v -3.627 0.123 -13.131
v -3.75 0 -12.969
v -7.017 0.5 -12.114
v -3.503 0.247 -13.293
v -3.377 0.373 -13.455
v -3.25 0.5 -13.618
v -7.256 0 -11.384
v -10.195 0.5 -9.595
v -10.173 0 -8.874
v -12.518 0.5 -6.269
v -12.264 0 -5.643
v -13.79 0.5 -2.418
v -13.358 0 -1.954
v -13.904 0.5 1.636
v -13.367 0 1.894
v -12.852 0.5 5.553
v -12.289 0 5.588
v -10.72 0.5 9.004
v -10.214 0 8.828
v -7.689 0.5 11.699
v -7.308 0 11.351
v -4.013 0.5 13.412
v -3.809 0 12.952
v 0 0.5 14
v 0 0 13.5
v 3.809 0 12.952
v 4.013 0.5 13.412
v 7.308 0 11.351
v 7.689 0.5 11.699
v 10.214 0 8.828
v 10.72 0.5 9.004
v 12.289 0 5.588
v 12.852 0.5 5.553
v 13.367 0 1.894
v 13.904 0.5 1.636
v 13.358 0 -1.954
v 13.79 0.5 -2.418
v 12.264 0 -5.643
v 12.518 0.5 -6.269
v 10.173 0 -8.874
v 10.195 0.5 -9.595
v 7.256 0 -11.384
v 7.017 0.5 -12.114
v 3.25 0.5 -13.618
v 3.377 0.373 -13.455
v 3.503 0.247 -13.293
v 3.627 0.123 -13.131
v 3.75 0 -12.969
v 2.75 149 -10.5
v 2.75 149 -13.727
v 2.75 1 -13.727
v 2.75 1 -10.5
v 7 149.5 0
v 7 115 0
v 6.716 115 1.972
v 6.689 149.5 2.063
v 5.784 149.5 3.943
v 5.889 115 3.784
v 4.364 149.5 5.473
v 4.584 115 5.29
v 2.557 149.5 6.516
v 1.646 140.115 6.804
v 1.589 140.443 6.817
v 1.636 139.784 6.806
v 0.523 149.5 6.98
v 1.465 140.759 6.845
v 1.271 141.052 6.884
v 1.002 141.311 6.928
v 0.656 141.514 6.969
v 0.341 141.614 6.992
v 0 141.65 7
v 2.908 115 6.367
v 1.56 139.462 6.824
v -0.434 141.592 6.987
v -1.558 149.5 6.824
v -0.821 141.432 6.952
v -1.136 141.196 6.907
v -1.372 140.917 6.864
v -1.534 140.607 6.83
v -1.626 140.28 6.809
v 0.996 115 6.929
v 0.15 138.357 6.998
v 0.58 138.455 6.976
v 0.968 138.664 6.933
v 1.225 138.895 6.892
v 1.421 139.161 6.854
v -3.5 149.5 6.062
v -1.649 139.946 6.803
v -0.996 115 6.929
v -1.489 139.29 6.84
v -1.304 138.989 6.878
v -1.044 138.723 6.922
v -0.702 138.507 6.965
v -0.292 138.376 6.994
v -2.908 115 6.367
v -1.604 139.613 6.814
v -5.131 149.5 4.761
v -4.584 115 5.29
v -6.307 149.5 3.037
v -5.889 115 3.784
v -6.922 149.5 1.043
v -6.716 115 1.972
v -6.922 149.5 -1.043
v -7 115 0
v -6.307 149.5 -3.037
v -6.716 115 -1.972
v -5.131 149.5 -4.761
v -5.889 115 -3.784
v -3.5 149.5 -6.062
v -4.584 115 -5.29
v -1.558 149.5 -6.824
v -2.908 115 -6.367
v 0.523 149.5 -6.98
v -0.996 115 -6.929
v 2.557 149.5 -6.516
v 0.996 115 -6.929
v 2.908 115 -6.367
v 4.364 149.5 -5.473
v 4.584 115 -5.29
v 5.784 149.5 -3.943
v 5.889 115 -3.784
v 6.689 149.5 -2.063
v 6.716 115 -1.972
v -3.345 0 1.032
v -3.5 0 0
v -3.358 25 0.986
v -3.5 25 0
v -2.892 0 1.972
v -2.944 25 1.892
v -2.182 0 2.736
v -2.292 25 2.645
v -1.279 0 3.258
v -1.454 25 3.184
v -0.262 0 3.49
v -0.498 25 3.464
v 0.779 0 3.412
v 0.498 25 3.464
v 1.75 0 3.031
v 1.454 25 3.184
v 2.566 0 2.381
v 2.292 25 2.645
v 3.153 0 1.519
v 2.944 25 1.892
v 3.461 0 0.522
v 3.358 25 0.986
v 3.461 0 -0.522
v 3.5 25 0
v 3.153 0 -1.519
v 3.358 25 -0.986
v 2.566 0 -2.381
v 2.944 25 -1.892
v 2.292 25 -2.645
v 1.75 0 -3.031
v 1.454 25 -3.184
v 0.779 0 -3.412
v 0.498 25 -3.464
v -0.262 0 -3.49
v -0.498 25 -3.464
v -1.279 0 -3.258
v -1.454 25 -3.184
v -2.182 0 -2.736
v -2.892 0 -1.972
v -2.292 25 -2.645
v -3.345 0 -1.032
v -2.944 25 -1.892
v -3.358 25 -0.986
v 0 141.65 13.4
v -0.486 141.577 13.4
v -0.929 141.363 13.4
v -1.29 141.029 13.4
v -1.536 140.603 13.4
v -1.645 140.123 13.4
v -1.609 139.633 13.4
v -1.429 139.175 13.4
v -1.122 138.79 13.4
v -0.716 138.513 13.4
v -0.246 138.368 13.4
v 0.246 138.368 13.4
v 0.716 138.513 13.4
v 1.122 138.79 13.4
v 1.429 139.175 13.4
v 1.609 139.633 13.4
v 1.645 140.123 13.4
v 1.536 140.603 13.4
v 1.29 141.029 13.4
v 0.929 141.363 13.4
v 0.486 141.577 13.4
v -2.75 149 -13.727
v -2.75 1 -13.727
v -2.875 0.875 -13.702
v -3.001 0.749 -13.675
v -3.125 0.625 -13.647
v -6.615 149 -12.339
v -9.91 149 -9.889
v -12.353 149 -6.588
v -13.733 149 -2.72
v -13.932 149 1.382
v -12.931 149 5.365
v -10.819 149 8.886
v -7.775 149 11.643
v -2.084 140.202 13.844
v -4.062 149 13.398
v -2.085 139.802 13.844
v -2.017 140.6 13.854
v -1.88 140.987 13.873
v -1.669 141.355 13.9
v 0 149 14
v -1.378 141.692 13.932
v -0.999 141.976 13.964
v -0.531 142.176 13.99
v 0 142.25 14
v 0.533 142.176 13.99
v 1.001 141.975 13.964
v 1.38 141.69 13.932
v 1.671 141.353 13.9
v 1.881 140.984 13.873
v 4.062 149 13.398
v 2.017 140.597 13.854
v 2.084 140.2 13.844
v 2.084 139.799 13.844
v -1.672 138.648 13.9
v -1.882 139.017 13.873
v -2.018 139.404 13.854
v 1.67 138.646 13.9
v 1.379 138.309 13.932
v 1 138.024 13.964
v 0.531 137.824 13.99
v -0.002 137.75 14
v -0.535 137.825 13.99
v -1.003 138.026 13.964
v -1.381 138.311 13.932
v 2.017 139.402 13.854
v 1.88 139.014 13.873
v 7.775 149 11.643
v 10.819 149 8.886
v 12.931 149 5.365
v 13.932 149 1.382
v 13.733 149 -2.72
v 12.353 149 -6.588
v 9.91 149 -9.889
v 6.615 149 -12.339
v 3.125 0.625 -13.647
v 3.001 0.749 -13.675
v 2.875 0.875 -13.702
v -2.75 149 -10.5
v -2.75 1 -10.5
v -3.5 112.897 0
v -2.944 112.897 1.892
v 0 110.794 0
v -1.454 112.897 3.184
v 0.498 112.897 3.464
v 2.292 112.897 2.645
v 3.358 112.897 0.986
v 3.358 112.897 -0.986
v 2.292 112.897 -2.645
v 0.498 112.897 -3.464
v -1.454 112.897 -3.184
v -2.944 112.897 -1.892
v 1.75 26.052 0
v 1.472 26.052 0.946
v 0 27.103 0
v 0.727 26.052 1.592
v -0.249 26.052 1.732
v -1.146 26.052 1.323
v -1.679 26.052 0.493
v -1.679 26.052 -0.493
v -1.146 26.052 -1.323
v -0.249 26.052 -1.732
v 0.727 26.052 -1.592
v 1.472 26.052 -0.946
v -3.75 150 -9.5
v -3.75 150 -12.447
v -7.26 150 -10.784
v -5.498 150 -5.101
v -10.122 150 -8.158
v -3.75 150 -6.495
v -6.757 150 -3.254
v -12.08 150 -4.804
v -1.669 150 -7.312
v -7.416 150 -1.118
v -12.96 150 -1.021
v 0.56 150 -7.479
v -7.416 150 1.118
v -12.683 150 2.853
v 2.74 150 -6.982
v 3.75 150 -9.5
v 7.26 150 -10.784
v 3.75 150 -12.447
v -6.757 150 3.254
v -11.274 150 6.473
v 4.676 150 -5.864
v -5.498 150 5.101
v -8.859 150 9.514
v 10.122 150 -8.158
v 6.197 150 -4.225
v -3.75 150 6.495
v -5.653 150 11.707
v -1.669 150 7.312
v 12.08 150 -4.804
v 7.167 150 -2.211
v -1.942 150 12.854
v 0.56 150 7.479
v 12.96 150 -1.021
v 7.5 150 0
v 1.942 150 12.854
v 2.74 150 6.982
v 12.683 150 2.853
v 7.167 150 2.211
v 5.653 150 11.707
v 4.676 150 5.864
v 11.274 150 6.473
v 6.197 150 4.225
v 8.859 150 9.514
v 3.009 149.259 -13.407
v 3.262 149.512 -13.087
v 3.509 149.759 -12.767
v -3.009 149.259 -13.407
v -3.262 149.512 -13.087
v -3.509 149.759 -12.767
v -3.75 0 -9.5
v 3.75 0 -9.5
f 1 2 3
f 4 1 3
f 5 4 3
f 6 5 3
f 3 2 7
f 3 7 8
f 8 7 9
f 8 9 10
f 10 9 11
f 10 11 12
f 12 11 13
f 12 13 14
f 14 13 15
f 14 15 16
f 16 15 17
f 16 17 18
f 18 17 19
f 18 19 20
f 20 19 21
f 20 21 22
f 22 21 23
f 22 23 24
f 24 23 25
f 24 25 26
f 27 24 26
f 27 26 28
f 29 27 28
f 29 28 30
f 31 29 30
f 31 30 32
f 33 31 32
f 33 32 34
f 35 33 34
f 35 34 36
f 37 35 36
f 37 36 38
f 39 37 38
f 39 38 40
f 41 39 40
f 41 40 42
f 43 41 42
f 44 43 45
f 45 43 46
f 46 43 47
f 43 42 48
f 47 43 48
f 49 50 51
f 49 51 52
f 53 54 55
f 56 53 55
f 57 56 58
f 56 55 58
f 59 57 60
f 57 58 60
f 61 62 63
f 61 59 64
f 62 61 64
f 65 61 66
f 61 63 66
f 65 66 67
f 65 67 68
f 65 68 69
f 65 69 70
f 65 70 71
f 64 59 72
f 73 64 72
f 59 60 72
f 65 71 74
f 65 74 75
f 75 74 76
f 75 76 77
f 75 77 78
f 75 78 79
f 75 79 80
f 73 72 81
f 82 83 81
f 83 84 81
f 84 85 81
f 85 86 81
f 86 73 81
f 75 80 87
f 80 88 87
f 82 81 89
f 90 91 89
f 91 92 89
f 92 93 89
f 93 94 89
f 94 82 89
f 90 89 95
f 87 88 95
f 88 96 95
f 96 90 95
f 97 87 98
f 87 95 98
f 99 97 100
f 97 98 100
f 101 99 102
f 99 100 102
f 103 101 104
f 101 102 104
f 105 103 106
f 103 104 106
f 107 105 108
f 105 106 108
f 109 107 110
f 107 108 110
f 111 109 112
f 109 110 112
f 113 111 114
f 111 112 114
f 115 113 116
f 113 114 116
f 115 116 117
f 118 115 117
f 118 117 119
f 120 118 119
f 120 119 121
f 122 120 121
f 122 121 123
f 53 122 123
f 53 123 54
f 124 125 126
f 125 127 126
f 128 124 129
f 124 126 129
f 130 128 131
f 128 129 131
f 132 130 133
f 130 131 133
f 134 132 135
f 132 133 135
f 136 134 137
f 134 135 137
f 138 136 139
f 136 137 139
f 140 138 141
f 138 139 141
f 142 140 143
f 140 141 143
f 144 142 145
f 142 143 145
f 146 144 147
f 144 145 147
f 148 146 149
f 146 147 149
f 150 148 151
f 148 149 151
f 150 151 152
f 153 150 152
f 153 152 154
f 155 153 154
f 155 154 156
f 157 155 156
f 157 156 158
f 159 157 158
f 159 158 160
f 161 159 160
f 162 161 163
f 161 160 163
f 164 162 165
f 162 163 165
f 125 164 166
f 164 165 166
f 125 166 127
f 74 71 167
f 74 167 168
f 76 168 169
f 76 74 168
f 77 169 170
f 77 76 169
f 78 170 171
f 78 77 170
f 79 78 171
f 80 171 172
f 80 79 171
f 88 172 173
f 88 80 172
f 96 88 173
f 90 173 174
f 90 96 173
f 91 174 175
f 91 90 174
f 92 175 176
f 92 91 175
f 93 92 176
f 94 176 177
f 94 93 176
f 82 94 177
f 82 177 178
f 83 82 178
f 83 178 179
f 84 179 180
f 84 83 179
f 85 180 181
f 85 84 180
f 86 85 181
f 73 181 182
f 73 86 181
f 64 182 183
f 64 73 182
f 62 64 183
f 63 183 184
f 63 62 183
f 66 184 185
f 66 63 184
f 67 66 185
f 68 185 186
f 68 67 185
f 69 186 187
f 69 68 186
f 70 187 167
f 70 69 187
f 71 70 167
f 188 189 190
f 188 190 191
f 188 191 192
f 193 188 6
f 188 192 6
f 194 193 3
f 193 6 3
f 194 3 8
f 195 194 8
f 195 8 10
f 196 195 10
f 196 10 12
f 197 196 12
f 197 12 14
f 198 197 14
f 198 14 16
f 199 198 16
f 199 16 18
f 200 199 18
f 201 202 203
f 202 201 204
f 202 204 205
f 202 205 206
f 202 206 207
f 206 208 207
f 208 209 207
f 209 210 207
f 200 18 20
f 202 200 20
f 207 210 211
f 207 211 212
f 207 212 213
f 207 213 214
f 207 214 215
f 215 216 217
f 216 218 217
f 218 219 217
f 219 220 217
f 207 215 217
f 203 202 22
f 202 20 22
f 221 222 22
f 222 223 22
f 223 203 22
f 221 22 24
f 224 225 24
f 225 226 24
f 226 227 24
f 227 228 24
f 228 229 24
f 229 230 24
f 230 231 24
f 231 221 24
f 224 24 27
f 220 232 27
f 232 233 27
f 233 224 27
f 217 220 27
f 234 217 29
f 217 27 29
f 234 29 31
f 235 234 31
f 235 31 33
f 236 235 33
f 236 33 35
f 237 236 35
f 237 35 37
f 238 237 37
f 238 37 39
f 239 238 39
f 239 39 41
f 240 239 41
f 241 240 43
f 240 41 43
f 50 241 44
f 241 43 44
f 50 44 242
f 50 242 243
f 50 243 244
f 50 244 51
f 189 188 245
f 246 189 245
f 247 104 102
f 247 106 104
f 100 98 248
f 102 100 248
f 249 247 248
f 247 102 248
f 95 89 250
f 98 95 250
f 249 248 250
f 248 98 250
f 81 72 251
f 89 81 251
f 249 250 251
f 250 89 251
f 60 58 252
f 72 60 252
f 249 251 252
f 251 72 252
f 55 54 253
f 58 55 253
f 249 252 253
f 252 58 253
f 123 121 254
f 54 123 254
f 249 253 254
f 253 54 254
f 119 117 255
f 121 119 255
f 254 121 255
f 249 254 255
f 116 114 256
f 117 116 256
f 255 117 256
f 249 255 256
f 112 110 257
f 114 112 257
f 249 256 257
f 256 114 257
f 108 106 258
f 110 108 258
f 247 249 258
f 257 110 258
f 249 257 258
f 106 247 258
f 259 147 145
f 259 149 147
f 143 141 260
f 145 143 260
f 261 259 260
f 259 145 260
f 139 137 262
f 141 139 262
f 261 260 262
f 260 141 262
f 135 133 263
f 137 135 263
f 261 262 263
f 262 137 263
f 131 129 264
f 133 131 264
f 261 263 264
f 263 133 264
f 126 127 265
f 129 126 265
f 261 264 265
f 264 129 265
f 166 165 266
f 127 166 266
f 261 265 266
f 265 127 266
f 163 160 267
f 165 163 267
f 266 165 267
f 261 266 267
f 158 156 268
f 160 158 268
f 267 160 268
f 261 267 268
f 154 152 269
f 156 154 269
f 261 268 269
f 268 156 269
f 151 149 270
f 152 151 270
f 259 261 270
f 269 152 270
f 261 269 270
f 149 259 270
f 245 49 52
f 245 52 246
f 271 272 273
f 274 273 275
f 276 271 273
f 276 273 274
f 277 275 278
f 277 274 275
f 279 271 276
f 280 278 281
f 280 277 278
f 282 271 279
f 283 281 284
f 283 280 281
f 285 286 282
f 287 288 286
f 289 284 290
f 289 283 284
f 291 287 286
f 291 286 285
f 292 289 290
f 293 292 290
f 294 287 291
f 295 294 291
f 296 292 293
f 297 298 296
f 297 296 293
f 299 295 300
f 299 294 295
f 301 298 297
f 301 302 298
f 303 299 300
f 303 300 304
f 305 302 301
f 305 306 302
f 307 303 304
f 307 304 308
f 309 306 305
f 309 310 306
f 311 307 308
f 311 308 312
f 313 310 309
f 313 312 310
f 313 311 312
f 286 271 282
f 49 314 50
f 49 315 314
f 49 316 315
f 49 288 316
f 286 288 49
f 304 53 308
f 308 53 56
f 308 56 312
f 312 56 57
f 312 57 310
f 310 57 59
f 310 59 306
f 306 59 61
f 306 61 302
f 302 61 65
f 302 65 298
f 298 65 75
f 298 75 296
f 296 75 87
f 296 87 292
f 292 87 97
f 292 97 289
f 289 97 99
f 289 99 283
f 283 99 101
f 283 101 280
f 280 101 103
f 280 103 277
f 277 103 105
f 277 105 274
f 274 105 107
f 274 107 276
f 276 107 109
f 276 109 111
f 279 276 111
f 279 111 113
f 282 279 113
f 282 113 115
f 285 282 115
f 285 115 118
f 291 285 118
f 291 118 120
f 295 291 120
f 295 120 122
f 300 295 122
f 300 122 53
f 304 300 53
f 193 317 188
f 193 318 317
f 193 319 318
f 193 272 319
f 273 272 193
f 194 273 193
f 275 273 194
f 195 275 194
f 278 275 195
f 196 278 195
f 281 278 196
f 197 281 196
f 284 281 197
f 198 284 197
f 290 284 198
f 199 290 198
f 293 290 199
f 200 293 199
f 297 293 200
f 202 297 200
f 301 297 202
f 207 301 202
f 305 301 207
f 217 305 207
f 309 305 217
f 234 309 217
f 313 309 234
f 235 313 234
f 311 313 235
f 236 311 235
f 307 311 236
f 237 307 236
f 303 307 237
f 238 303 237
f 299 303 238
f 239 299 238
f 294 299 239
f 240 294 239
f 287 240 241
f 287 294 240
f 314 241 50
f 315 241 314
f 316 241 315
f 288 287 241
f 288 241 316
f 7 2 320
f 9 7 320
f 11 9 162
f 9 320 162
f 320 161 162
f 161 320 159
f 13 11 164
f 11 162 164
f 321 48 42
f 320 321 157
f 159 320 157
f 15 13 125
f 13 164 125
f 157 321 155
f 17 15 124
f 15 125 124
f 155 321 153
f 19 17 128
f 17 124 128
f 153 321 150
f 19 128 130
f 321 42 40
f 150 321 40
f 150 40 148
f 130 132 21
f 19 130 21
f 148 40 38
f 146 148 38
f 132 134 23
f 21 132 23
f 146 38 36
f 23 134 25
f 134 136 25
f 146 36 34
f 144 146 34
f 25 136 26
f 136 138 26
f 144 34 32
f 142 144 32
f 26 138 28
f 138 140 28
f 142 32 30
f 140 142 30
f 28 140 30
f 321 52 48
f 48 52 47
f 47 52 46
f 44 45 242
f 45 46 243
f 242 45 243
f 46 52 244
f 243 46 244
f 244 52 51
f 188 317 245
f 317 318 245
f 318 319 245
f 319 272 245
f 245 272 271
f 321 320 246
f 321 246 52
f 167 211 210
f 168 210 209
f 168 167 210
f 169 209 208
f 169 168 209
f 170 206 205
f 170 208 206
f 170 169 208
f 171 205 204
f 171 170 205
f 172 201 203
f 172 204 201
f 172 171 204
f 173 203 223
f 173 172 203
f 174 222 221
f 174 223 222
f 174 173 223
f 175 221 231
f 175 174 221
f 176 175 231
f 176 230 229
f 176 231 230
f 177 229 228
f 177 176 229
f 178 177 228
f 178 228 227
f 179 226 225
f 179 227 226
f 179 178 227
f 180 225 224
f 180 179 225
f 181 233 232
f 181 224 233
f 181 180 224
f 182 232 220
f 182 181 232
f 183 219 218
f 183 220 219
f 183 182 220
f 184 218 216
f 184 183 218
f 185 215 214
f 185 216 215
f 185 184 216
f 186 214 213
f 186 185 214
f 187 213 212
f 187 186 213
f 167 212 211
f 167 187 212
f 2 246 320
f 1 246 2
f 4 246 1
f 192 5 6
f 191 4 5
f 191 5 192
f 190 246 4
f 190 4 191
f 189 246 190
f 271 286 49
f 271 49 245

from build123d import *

# Parameters (mm, degrees)
ESQUISSE1_R                               = 14
BOSS_EXTRU_1_DEPTH                        = 150
CHANFREIN1_SIZE                           = 1
DIAM_TRE_DU_PER_AGE_14_0_14_1_D           = 14
DIAM_TRE_DU_PER_AGE_14_0_14_1_DEPTH       = 35
DIAM_TRE_DU_PER_AGE_14_0_14_1_CSINK_D     = 15
DIAM_TRE_DU_PER_AGE_14_0_14_1_CSINK_ANGLE = 90
DIAM_TRE_DU_PER_AGE_14_0_14_1_TIP         = 4.206024333
CHANFREIN2_SIZE                           = 0.5
TROU_TARAUD_M8X1_01_D                     = 7
TROU_TARAUD_M8X1_01_DEPTH                 = 25
TROU_TARAUD_M8X1_01_TIP                   = 2.103012167
ENL_V_MAT_EXTRU_1_REACH                   = 152
ESQUISSE13_W                              = 5.5
ESQUISSE13_H                              = 4.102839415
CHANFREIN3_SIZE                           = 1
CHANFREIN4_SIZE                           = 1


with BuildPart() as part:
    # Esquisse1 → Boss.-Extru.1 (new body)
    with BuildSketch(Plane(origin=(0, 0, 0), x_dir=(1, 0, 0), z_dir=(0, 1, 0))):
        with Locations(Location((0, 0, 0), (0, 0, 270))):  # turned: the seam where the file's is
            Circle(ESQUISSE1_R)
    extrude(amount=BOSS_EXTRU_1_DEPTH)

    # Chanfrein1
    chanfrein1_edges = [part.edges().sort_by_distance(p)[0] for p in [
        (0, 150, -14),
    ]]
    chamfer(chanfrein1_edges, length=CHANFREIN1_SIZE)

    # Diamètre du perçage Ø14.0 (14)1
    with Locations(Plane(origin=(0, 150, 0), x_dir=(-1, 0, 0), z_dir=(0, 1, 0))):
        with Locations((0, 0)):
            CounterSinkHole(DIAM_TRE_DU_PER_AGE_14_0_14_1_D / 2, DIAM_TRE_DU_PER_AGE_14_0_14_1_CSINK_D / 2, depth=DIAM_TRE_DU_PER_AGE_14_0_14_1_DEPTH, counter_sink_angle=DIAM_TRE_DU_PER_AGE_14_0_14_1_CSINK_ANGLE)
            with Locations((0, 0, -(DIAM_TRE_DU_PER_AGE_14_0_14_1_DEPTH + DIAM_TRE_DU_PER_AGE_14_0_14_1_TIP / 2))):  # 118° drill point
                Cone(0, DIAM_TRE_DU_PER_AGE_14_0_14_1_D / 2, DIAM_TRE_DU_PER_AGE_14_0_14_1_TIP, mode=Mode.SUBTRACT)

    # Chanfrein2
    chanfrein2_edges = [part.edges().sort_by_distance(p)[0] for p in [
        (0, 0, -14),
    ]]
    chamfer(chanfrein2_edges, length=CHANFREIN2_SIZE)

    # Trou taraudé M8x1.01
    with Locations(Plane.XZ):
        with Locations((0, 0)):
            Hole(TROU_TARAUD_M8X1_01_D / 2, depth=TROU_TARAUD_M8X1_01_DEPTH)
            with Locations((0, 0, -(TROU_TARAUD_M8X1_01_DEPTH + TROU_TARAUD_M8X1_01_TIP / 2))):  # 118° drill point
                Cone(0, TROU_TARAUD_M8X1_01_D / 2, TROU_TARAUD_M8X1_01_TIP, mode=Mode.SUBTRACT)

    # Esquisse11 → Trou taraudé M42 (revolve, cut)
    with BuildSketch(Plane(origin=(0, 140, 0), x_dir=(0, 1, 0), z_dir=(1, 0, 0))):
        Polygon((0, 0), (0, 14), (2.25, 14), (1.65, 13.4), (1.65, 0), align=None)
    revolve(axis=Axis((0, 140, -6.35), (0, 0, 1)), mode=Mode.SUBTRACT)

    # Esquisse13 → Enlèv. mat.-Extru.1 (cut, up to next)
    with BuildSketch(Plane(origin=(0, 150, 0), x_dir=(-1, 0, 0), z_dir=(0, 1, 0)), mode=Mode.PRIVATE) as enl_v_mat_extru_1_sk1:
        with Locations((0, -12.551419707)):
            Rectangle(ESQUISSE13_W, ESQUISSE13_H)
    enl_v_mat_extru_1_tool1 = extrude(enl_v_mat_extru_1_sk1.sketch, amount=-ENL_V_MAT_EXTRU_1_REACH, mode=Mode.PRIVATE) & part.part
    add(enl_v_mat_extru_1_tool1.solids().sort_by_distance((0, 150, -12.55142))[0], mode=Mode.SUBTRACT)

    # Chanfrein3
    chanfrein3_edges = [part.edges().sort_by_distance(p)[0] for p in [
        (2.75, 0, -11.858469944),
        (-2.75, 0, -11.858469944),
        (0, 0, -10.5),
    ]]
    chamfer(chanfrein3_edges, length=CHANFREIN3_SIZE)

    # Chanfrein4
    chanfrein4_edges = [part.edges().sort_by_distance(p)[0] for p in [
        (2.75, 150, -11.60290288),
        (-2.75, 150, -11.60290288),
        (0, 150, -10.5),
    ]]
    chamfer(chanfrein4_edges, length=CHANFREIN4_SIZE)


solid = part.part
